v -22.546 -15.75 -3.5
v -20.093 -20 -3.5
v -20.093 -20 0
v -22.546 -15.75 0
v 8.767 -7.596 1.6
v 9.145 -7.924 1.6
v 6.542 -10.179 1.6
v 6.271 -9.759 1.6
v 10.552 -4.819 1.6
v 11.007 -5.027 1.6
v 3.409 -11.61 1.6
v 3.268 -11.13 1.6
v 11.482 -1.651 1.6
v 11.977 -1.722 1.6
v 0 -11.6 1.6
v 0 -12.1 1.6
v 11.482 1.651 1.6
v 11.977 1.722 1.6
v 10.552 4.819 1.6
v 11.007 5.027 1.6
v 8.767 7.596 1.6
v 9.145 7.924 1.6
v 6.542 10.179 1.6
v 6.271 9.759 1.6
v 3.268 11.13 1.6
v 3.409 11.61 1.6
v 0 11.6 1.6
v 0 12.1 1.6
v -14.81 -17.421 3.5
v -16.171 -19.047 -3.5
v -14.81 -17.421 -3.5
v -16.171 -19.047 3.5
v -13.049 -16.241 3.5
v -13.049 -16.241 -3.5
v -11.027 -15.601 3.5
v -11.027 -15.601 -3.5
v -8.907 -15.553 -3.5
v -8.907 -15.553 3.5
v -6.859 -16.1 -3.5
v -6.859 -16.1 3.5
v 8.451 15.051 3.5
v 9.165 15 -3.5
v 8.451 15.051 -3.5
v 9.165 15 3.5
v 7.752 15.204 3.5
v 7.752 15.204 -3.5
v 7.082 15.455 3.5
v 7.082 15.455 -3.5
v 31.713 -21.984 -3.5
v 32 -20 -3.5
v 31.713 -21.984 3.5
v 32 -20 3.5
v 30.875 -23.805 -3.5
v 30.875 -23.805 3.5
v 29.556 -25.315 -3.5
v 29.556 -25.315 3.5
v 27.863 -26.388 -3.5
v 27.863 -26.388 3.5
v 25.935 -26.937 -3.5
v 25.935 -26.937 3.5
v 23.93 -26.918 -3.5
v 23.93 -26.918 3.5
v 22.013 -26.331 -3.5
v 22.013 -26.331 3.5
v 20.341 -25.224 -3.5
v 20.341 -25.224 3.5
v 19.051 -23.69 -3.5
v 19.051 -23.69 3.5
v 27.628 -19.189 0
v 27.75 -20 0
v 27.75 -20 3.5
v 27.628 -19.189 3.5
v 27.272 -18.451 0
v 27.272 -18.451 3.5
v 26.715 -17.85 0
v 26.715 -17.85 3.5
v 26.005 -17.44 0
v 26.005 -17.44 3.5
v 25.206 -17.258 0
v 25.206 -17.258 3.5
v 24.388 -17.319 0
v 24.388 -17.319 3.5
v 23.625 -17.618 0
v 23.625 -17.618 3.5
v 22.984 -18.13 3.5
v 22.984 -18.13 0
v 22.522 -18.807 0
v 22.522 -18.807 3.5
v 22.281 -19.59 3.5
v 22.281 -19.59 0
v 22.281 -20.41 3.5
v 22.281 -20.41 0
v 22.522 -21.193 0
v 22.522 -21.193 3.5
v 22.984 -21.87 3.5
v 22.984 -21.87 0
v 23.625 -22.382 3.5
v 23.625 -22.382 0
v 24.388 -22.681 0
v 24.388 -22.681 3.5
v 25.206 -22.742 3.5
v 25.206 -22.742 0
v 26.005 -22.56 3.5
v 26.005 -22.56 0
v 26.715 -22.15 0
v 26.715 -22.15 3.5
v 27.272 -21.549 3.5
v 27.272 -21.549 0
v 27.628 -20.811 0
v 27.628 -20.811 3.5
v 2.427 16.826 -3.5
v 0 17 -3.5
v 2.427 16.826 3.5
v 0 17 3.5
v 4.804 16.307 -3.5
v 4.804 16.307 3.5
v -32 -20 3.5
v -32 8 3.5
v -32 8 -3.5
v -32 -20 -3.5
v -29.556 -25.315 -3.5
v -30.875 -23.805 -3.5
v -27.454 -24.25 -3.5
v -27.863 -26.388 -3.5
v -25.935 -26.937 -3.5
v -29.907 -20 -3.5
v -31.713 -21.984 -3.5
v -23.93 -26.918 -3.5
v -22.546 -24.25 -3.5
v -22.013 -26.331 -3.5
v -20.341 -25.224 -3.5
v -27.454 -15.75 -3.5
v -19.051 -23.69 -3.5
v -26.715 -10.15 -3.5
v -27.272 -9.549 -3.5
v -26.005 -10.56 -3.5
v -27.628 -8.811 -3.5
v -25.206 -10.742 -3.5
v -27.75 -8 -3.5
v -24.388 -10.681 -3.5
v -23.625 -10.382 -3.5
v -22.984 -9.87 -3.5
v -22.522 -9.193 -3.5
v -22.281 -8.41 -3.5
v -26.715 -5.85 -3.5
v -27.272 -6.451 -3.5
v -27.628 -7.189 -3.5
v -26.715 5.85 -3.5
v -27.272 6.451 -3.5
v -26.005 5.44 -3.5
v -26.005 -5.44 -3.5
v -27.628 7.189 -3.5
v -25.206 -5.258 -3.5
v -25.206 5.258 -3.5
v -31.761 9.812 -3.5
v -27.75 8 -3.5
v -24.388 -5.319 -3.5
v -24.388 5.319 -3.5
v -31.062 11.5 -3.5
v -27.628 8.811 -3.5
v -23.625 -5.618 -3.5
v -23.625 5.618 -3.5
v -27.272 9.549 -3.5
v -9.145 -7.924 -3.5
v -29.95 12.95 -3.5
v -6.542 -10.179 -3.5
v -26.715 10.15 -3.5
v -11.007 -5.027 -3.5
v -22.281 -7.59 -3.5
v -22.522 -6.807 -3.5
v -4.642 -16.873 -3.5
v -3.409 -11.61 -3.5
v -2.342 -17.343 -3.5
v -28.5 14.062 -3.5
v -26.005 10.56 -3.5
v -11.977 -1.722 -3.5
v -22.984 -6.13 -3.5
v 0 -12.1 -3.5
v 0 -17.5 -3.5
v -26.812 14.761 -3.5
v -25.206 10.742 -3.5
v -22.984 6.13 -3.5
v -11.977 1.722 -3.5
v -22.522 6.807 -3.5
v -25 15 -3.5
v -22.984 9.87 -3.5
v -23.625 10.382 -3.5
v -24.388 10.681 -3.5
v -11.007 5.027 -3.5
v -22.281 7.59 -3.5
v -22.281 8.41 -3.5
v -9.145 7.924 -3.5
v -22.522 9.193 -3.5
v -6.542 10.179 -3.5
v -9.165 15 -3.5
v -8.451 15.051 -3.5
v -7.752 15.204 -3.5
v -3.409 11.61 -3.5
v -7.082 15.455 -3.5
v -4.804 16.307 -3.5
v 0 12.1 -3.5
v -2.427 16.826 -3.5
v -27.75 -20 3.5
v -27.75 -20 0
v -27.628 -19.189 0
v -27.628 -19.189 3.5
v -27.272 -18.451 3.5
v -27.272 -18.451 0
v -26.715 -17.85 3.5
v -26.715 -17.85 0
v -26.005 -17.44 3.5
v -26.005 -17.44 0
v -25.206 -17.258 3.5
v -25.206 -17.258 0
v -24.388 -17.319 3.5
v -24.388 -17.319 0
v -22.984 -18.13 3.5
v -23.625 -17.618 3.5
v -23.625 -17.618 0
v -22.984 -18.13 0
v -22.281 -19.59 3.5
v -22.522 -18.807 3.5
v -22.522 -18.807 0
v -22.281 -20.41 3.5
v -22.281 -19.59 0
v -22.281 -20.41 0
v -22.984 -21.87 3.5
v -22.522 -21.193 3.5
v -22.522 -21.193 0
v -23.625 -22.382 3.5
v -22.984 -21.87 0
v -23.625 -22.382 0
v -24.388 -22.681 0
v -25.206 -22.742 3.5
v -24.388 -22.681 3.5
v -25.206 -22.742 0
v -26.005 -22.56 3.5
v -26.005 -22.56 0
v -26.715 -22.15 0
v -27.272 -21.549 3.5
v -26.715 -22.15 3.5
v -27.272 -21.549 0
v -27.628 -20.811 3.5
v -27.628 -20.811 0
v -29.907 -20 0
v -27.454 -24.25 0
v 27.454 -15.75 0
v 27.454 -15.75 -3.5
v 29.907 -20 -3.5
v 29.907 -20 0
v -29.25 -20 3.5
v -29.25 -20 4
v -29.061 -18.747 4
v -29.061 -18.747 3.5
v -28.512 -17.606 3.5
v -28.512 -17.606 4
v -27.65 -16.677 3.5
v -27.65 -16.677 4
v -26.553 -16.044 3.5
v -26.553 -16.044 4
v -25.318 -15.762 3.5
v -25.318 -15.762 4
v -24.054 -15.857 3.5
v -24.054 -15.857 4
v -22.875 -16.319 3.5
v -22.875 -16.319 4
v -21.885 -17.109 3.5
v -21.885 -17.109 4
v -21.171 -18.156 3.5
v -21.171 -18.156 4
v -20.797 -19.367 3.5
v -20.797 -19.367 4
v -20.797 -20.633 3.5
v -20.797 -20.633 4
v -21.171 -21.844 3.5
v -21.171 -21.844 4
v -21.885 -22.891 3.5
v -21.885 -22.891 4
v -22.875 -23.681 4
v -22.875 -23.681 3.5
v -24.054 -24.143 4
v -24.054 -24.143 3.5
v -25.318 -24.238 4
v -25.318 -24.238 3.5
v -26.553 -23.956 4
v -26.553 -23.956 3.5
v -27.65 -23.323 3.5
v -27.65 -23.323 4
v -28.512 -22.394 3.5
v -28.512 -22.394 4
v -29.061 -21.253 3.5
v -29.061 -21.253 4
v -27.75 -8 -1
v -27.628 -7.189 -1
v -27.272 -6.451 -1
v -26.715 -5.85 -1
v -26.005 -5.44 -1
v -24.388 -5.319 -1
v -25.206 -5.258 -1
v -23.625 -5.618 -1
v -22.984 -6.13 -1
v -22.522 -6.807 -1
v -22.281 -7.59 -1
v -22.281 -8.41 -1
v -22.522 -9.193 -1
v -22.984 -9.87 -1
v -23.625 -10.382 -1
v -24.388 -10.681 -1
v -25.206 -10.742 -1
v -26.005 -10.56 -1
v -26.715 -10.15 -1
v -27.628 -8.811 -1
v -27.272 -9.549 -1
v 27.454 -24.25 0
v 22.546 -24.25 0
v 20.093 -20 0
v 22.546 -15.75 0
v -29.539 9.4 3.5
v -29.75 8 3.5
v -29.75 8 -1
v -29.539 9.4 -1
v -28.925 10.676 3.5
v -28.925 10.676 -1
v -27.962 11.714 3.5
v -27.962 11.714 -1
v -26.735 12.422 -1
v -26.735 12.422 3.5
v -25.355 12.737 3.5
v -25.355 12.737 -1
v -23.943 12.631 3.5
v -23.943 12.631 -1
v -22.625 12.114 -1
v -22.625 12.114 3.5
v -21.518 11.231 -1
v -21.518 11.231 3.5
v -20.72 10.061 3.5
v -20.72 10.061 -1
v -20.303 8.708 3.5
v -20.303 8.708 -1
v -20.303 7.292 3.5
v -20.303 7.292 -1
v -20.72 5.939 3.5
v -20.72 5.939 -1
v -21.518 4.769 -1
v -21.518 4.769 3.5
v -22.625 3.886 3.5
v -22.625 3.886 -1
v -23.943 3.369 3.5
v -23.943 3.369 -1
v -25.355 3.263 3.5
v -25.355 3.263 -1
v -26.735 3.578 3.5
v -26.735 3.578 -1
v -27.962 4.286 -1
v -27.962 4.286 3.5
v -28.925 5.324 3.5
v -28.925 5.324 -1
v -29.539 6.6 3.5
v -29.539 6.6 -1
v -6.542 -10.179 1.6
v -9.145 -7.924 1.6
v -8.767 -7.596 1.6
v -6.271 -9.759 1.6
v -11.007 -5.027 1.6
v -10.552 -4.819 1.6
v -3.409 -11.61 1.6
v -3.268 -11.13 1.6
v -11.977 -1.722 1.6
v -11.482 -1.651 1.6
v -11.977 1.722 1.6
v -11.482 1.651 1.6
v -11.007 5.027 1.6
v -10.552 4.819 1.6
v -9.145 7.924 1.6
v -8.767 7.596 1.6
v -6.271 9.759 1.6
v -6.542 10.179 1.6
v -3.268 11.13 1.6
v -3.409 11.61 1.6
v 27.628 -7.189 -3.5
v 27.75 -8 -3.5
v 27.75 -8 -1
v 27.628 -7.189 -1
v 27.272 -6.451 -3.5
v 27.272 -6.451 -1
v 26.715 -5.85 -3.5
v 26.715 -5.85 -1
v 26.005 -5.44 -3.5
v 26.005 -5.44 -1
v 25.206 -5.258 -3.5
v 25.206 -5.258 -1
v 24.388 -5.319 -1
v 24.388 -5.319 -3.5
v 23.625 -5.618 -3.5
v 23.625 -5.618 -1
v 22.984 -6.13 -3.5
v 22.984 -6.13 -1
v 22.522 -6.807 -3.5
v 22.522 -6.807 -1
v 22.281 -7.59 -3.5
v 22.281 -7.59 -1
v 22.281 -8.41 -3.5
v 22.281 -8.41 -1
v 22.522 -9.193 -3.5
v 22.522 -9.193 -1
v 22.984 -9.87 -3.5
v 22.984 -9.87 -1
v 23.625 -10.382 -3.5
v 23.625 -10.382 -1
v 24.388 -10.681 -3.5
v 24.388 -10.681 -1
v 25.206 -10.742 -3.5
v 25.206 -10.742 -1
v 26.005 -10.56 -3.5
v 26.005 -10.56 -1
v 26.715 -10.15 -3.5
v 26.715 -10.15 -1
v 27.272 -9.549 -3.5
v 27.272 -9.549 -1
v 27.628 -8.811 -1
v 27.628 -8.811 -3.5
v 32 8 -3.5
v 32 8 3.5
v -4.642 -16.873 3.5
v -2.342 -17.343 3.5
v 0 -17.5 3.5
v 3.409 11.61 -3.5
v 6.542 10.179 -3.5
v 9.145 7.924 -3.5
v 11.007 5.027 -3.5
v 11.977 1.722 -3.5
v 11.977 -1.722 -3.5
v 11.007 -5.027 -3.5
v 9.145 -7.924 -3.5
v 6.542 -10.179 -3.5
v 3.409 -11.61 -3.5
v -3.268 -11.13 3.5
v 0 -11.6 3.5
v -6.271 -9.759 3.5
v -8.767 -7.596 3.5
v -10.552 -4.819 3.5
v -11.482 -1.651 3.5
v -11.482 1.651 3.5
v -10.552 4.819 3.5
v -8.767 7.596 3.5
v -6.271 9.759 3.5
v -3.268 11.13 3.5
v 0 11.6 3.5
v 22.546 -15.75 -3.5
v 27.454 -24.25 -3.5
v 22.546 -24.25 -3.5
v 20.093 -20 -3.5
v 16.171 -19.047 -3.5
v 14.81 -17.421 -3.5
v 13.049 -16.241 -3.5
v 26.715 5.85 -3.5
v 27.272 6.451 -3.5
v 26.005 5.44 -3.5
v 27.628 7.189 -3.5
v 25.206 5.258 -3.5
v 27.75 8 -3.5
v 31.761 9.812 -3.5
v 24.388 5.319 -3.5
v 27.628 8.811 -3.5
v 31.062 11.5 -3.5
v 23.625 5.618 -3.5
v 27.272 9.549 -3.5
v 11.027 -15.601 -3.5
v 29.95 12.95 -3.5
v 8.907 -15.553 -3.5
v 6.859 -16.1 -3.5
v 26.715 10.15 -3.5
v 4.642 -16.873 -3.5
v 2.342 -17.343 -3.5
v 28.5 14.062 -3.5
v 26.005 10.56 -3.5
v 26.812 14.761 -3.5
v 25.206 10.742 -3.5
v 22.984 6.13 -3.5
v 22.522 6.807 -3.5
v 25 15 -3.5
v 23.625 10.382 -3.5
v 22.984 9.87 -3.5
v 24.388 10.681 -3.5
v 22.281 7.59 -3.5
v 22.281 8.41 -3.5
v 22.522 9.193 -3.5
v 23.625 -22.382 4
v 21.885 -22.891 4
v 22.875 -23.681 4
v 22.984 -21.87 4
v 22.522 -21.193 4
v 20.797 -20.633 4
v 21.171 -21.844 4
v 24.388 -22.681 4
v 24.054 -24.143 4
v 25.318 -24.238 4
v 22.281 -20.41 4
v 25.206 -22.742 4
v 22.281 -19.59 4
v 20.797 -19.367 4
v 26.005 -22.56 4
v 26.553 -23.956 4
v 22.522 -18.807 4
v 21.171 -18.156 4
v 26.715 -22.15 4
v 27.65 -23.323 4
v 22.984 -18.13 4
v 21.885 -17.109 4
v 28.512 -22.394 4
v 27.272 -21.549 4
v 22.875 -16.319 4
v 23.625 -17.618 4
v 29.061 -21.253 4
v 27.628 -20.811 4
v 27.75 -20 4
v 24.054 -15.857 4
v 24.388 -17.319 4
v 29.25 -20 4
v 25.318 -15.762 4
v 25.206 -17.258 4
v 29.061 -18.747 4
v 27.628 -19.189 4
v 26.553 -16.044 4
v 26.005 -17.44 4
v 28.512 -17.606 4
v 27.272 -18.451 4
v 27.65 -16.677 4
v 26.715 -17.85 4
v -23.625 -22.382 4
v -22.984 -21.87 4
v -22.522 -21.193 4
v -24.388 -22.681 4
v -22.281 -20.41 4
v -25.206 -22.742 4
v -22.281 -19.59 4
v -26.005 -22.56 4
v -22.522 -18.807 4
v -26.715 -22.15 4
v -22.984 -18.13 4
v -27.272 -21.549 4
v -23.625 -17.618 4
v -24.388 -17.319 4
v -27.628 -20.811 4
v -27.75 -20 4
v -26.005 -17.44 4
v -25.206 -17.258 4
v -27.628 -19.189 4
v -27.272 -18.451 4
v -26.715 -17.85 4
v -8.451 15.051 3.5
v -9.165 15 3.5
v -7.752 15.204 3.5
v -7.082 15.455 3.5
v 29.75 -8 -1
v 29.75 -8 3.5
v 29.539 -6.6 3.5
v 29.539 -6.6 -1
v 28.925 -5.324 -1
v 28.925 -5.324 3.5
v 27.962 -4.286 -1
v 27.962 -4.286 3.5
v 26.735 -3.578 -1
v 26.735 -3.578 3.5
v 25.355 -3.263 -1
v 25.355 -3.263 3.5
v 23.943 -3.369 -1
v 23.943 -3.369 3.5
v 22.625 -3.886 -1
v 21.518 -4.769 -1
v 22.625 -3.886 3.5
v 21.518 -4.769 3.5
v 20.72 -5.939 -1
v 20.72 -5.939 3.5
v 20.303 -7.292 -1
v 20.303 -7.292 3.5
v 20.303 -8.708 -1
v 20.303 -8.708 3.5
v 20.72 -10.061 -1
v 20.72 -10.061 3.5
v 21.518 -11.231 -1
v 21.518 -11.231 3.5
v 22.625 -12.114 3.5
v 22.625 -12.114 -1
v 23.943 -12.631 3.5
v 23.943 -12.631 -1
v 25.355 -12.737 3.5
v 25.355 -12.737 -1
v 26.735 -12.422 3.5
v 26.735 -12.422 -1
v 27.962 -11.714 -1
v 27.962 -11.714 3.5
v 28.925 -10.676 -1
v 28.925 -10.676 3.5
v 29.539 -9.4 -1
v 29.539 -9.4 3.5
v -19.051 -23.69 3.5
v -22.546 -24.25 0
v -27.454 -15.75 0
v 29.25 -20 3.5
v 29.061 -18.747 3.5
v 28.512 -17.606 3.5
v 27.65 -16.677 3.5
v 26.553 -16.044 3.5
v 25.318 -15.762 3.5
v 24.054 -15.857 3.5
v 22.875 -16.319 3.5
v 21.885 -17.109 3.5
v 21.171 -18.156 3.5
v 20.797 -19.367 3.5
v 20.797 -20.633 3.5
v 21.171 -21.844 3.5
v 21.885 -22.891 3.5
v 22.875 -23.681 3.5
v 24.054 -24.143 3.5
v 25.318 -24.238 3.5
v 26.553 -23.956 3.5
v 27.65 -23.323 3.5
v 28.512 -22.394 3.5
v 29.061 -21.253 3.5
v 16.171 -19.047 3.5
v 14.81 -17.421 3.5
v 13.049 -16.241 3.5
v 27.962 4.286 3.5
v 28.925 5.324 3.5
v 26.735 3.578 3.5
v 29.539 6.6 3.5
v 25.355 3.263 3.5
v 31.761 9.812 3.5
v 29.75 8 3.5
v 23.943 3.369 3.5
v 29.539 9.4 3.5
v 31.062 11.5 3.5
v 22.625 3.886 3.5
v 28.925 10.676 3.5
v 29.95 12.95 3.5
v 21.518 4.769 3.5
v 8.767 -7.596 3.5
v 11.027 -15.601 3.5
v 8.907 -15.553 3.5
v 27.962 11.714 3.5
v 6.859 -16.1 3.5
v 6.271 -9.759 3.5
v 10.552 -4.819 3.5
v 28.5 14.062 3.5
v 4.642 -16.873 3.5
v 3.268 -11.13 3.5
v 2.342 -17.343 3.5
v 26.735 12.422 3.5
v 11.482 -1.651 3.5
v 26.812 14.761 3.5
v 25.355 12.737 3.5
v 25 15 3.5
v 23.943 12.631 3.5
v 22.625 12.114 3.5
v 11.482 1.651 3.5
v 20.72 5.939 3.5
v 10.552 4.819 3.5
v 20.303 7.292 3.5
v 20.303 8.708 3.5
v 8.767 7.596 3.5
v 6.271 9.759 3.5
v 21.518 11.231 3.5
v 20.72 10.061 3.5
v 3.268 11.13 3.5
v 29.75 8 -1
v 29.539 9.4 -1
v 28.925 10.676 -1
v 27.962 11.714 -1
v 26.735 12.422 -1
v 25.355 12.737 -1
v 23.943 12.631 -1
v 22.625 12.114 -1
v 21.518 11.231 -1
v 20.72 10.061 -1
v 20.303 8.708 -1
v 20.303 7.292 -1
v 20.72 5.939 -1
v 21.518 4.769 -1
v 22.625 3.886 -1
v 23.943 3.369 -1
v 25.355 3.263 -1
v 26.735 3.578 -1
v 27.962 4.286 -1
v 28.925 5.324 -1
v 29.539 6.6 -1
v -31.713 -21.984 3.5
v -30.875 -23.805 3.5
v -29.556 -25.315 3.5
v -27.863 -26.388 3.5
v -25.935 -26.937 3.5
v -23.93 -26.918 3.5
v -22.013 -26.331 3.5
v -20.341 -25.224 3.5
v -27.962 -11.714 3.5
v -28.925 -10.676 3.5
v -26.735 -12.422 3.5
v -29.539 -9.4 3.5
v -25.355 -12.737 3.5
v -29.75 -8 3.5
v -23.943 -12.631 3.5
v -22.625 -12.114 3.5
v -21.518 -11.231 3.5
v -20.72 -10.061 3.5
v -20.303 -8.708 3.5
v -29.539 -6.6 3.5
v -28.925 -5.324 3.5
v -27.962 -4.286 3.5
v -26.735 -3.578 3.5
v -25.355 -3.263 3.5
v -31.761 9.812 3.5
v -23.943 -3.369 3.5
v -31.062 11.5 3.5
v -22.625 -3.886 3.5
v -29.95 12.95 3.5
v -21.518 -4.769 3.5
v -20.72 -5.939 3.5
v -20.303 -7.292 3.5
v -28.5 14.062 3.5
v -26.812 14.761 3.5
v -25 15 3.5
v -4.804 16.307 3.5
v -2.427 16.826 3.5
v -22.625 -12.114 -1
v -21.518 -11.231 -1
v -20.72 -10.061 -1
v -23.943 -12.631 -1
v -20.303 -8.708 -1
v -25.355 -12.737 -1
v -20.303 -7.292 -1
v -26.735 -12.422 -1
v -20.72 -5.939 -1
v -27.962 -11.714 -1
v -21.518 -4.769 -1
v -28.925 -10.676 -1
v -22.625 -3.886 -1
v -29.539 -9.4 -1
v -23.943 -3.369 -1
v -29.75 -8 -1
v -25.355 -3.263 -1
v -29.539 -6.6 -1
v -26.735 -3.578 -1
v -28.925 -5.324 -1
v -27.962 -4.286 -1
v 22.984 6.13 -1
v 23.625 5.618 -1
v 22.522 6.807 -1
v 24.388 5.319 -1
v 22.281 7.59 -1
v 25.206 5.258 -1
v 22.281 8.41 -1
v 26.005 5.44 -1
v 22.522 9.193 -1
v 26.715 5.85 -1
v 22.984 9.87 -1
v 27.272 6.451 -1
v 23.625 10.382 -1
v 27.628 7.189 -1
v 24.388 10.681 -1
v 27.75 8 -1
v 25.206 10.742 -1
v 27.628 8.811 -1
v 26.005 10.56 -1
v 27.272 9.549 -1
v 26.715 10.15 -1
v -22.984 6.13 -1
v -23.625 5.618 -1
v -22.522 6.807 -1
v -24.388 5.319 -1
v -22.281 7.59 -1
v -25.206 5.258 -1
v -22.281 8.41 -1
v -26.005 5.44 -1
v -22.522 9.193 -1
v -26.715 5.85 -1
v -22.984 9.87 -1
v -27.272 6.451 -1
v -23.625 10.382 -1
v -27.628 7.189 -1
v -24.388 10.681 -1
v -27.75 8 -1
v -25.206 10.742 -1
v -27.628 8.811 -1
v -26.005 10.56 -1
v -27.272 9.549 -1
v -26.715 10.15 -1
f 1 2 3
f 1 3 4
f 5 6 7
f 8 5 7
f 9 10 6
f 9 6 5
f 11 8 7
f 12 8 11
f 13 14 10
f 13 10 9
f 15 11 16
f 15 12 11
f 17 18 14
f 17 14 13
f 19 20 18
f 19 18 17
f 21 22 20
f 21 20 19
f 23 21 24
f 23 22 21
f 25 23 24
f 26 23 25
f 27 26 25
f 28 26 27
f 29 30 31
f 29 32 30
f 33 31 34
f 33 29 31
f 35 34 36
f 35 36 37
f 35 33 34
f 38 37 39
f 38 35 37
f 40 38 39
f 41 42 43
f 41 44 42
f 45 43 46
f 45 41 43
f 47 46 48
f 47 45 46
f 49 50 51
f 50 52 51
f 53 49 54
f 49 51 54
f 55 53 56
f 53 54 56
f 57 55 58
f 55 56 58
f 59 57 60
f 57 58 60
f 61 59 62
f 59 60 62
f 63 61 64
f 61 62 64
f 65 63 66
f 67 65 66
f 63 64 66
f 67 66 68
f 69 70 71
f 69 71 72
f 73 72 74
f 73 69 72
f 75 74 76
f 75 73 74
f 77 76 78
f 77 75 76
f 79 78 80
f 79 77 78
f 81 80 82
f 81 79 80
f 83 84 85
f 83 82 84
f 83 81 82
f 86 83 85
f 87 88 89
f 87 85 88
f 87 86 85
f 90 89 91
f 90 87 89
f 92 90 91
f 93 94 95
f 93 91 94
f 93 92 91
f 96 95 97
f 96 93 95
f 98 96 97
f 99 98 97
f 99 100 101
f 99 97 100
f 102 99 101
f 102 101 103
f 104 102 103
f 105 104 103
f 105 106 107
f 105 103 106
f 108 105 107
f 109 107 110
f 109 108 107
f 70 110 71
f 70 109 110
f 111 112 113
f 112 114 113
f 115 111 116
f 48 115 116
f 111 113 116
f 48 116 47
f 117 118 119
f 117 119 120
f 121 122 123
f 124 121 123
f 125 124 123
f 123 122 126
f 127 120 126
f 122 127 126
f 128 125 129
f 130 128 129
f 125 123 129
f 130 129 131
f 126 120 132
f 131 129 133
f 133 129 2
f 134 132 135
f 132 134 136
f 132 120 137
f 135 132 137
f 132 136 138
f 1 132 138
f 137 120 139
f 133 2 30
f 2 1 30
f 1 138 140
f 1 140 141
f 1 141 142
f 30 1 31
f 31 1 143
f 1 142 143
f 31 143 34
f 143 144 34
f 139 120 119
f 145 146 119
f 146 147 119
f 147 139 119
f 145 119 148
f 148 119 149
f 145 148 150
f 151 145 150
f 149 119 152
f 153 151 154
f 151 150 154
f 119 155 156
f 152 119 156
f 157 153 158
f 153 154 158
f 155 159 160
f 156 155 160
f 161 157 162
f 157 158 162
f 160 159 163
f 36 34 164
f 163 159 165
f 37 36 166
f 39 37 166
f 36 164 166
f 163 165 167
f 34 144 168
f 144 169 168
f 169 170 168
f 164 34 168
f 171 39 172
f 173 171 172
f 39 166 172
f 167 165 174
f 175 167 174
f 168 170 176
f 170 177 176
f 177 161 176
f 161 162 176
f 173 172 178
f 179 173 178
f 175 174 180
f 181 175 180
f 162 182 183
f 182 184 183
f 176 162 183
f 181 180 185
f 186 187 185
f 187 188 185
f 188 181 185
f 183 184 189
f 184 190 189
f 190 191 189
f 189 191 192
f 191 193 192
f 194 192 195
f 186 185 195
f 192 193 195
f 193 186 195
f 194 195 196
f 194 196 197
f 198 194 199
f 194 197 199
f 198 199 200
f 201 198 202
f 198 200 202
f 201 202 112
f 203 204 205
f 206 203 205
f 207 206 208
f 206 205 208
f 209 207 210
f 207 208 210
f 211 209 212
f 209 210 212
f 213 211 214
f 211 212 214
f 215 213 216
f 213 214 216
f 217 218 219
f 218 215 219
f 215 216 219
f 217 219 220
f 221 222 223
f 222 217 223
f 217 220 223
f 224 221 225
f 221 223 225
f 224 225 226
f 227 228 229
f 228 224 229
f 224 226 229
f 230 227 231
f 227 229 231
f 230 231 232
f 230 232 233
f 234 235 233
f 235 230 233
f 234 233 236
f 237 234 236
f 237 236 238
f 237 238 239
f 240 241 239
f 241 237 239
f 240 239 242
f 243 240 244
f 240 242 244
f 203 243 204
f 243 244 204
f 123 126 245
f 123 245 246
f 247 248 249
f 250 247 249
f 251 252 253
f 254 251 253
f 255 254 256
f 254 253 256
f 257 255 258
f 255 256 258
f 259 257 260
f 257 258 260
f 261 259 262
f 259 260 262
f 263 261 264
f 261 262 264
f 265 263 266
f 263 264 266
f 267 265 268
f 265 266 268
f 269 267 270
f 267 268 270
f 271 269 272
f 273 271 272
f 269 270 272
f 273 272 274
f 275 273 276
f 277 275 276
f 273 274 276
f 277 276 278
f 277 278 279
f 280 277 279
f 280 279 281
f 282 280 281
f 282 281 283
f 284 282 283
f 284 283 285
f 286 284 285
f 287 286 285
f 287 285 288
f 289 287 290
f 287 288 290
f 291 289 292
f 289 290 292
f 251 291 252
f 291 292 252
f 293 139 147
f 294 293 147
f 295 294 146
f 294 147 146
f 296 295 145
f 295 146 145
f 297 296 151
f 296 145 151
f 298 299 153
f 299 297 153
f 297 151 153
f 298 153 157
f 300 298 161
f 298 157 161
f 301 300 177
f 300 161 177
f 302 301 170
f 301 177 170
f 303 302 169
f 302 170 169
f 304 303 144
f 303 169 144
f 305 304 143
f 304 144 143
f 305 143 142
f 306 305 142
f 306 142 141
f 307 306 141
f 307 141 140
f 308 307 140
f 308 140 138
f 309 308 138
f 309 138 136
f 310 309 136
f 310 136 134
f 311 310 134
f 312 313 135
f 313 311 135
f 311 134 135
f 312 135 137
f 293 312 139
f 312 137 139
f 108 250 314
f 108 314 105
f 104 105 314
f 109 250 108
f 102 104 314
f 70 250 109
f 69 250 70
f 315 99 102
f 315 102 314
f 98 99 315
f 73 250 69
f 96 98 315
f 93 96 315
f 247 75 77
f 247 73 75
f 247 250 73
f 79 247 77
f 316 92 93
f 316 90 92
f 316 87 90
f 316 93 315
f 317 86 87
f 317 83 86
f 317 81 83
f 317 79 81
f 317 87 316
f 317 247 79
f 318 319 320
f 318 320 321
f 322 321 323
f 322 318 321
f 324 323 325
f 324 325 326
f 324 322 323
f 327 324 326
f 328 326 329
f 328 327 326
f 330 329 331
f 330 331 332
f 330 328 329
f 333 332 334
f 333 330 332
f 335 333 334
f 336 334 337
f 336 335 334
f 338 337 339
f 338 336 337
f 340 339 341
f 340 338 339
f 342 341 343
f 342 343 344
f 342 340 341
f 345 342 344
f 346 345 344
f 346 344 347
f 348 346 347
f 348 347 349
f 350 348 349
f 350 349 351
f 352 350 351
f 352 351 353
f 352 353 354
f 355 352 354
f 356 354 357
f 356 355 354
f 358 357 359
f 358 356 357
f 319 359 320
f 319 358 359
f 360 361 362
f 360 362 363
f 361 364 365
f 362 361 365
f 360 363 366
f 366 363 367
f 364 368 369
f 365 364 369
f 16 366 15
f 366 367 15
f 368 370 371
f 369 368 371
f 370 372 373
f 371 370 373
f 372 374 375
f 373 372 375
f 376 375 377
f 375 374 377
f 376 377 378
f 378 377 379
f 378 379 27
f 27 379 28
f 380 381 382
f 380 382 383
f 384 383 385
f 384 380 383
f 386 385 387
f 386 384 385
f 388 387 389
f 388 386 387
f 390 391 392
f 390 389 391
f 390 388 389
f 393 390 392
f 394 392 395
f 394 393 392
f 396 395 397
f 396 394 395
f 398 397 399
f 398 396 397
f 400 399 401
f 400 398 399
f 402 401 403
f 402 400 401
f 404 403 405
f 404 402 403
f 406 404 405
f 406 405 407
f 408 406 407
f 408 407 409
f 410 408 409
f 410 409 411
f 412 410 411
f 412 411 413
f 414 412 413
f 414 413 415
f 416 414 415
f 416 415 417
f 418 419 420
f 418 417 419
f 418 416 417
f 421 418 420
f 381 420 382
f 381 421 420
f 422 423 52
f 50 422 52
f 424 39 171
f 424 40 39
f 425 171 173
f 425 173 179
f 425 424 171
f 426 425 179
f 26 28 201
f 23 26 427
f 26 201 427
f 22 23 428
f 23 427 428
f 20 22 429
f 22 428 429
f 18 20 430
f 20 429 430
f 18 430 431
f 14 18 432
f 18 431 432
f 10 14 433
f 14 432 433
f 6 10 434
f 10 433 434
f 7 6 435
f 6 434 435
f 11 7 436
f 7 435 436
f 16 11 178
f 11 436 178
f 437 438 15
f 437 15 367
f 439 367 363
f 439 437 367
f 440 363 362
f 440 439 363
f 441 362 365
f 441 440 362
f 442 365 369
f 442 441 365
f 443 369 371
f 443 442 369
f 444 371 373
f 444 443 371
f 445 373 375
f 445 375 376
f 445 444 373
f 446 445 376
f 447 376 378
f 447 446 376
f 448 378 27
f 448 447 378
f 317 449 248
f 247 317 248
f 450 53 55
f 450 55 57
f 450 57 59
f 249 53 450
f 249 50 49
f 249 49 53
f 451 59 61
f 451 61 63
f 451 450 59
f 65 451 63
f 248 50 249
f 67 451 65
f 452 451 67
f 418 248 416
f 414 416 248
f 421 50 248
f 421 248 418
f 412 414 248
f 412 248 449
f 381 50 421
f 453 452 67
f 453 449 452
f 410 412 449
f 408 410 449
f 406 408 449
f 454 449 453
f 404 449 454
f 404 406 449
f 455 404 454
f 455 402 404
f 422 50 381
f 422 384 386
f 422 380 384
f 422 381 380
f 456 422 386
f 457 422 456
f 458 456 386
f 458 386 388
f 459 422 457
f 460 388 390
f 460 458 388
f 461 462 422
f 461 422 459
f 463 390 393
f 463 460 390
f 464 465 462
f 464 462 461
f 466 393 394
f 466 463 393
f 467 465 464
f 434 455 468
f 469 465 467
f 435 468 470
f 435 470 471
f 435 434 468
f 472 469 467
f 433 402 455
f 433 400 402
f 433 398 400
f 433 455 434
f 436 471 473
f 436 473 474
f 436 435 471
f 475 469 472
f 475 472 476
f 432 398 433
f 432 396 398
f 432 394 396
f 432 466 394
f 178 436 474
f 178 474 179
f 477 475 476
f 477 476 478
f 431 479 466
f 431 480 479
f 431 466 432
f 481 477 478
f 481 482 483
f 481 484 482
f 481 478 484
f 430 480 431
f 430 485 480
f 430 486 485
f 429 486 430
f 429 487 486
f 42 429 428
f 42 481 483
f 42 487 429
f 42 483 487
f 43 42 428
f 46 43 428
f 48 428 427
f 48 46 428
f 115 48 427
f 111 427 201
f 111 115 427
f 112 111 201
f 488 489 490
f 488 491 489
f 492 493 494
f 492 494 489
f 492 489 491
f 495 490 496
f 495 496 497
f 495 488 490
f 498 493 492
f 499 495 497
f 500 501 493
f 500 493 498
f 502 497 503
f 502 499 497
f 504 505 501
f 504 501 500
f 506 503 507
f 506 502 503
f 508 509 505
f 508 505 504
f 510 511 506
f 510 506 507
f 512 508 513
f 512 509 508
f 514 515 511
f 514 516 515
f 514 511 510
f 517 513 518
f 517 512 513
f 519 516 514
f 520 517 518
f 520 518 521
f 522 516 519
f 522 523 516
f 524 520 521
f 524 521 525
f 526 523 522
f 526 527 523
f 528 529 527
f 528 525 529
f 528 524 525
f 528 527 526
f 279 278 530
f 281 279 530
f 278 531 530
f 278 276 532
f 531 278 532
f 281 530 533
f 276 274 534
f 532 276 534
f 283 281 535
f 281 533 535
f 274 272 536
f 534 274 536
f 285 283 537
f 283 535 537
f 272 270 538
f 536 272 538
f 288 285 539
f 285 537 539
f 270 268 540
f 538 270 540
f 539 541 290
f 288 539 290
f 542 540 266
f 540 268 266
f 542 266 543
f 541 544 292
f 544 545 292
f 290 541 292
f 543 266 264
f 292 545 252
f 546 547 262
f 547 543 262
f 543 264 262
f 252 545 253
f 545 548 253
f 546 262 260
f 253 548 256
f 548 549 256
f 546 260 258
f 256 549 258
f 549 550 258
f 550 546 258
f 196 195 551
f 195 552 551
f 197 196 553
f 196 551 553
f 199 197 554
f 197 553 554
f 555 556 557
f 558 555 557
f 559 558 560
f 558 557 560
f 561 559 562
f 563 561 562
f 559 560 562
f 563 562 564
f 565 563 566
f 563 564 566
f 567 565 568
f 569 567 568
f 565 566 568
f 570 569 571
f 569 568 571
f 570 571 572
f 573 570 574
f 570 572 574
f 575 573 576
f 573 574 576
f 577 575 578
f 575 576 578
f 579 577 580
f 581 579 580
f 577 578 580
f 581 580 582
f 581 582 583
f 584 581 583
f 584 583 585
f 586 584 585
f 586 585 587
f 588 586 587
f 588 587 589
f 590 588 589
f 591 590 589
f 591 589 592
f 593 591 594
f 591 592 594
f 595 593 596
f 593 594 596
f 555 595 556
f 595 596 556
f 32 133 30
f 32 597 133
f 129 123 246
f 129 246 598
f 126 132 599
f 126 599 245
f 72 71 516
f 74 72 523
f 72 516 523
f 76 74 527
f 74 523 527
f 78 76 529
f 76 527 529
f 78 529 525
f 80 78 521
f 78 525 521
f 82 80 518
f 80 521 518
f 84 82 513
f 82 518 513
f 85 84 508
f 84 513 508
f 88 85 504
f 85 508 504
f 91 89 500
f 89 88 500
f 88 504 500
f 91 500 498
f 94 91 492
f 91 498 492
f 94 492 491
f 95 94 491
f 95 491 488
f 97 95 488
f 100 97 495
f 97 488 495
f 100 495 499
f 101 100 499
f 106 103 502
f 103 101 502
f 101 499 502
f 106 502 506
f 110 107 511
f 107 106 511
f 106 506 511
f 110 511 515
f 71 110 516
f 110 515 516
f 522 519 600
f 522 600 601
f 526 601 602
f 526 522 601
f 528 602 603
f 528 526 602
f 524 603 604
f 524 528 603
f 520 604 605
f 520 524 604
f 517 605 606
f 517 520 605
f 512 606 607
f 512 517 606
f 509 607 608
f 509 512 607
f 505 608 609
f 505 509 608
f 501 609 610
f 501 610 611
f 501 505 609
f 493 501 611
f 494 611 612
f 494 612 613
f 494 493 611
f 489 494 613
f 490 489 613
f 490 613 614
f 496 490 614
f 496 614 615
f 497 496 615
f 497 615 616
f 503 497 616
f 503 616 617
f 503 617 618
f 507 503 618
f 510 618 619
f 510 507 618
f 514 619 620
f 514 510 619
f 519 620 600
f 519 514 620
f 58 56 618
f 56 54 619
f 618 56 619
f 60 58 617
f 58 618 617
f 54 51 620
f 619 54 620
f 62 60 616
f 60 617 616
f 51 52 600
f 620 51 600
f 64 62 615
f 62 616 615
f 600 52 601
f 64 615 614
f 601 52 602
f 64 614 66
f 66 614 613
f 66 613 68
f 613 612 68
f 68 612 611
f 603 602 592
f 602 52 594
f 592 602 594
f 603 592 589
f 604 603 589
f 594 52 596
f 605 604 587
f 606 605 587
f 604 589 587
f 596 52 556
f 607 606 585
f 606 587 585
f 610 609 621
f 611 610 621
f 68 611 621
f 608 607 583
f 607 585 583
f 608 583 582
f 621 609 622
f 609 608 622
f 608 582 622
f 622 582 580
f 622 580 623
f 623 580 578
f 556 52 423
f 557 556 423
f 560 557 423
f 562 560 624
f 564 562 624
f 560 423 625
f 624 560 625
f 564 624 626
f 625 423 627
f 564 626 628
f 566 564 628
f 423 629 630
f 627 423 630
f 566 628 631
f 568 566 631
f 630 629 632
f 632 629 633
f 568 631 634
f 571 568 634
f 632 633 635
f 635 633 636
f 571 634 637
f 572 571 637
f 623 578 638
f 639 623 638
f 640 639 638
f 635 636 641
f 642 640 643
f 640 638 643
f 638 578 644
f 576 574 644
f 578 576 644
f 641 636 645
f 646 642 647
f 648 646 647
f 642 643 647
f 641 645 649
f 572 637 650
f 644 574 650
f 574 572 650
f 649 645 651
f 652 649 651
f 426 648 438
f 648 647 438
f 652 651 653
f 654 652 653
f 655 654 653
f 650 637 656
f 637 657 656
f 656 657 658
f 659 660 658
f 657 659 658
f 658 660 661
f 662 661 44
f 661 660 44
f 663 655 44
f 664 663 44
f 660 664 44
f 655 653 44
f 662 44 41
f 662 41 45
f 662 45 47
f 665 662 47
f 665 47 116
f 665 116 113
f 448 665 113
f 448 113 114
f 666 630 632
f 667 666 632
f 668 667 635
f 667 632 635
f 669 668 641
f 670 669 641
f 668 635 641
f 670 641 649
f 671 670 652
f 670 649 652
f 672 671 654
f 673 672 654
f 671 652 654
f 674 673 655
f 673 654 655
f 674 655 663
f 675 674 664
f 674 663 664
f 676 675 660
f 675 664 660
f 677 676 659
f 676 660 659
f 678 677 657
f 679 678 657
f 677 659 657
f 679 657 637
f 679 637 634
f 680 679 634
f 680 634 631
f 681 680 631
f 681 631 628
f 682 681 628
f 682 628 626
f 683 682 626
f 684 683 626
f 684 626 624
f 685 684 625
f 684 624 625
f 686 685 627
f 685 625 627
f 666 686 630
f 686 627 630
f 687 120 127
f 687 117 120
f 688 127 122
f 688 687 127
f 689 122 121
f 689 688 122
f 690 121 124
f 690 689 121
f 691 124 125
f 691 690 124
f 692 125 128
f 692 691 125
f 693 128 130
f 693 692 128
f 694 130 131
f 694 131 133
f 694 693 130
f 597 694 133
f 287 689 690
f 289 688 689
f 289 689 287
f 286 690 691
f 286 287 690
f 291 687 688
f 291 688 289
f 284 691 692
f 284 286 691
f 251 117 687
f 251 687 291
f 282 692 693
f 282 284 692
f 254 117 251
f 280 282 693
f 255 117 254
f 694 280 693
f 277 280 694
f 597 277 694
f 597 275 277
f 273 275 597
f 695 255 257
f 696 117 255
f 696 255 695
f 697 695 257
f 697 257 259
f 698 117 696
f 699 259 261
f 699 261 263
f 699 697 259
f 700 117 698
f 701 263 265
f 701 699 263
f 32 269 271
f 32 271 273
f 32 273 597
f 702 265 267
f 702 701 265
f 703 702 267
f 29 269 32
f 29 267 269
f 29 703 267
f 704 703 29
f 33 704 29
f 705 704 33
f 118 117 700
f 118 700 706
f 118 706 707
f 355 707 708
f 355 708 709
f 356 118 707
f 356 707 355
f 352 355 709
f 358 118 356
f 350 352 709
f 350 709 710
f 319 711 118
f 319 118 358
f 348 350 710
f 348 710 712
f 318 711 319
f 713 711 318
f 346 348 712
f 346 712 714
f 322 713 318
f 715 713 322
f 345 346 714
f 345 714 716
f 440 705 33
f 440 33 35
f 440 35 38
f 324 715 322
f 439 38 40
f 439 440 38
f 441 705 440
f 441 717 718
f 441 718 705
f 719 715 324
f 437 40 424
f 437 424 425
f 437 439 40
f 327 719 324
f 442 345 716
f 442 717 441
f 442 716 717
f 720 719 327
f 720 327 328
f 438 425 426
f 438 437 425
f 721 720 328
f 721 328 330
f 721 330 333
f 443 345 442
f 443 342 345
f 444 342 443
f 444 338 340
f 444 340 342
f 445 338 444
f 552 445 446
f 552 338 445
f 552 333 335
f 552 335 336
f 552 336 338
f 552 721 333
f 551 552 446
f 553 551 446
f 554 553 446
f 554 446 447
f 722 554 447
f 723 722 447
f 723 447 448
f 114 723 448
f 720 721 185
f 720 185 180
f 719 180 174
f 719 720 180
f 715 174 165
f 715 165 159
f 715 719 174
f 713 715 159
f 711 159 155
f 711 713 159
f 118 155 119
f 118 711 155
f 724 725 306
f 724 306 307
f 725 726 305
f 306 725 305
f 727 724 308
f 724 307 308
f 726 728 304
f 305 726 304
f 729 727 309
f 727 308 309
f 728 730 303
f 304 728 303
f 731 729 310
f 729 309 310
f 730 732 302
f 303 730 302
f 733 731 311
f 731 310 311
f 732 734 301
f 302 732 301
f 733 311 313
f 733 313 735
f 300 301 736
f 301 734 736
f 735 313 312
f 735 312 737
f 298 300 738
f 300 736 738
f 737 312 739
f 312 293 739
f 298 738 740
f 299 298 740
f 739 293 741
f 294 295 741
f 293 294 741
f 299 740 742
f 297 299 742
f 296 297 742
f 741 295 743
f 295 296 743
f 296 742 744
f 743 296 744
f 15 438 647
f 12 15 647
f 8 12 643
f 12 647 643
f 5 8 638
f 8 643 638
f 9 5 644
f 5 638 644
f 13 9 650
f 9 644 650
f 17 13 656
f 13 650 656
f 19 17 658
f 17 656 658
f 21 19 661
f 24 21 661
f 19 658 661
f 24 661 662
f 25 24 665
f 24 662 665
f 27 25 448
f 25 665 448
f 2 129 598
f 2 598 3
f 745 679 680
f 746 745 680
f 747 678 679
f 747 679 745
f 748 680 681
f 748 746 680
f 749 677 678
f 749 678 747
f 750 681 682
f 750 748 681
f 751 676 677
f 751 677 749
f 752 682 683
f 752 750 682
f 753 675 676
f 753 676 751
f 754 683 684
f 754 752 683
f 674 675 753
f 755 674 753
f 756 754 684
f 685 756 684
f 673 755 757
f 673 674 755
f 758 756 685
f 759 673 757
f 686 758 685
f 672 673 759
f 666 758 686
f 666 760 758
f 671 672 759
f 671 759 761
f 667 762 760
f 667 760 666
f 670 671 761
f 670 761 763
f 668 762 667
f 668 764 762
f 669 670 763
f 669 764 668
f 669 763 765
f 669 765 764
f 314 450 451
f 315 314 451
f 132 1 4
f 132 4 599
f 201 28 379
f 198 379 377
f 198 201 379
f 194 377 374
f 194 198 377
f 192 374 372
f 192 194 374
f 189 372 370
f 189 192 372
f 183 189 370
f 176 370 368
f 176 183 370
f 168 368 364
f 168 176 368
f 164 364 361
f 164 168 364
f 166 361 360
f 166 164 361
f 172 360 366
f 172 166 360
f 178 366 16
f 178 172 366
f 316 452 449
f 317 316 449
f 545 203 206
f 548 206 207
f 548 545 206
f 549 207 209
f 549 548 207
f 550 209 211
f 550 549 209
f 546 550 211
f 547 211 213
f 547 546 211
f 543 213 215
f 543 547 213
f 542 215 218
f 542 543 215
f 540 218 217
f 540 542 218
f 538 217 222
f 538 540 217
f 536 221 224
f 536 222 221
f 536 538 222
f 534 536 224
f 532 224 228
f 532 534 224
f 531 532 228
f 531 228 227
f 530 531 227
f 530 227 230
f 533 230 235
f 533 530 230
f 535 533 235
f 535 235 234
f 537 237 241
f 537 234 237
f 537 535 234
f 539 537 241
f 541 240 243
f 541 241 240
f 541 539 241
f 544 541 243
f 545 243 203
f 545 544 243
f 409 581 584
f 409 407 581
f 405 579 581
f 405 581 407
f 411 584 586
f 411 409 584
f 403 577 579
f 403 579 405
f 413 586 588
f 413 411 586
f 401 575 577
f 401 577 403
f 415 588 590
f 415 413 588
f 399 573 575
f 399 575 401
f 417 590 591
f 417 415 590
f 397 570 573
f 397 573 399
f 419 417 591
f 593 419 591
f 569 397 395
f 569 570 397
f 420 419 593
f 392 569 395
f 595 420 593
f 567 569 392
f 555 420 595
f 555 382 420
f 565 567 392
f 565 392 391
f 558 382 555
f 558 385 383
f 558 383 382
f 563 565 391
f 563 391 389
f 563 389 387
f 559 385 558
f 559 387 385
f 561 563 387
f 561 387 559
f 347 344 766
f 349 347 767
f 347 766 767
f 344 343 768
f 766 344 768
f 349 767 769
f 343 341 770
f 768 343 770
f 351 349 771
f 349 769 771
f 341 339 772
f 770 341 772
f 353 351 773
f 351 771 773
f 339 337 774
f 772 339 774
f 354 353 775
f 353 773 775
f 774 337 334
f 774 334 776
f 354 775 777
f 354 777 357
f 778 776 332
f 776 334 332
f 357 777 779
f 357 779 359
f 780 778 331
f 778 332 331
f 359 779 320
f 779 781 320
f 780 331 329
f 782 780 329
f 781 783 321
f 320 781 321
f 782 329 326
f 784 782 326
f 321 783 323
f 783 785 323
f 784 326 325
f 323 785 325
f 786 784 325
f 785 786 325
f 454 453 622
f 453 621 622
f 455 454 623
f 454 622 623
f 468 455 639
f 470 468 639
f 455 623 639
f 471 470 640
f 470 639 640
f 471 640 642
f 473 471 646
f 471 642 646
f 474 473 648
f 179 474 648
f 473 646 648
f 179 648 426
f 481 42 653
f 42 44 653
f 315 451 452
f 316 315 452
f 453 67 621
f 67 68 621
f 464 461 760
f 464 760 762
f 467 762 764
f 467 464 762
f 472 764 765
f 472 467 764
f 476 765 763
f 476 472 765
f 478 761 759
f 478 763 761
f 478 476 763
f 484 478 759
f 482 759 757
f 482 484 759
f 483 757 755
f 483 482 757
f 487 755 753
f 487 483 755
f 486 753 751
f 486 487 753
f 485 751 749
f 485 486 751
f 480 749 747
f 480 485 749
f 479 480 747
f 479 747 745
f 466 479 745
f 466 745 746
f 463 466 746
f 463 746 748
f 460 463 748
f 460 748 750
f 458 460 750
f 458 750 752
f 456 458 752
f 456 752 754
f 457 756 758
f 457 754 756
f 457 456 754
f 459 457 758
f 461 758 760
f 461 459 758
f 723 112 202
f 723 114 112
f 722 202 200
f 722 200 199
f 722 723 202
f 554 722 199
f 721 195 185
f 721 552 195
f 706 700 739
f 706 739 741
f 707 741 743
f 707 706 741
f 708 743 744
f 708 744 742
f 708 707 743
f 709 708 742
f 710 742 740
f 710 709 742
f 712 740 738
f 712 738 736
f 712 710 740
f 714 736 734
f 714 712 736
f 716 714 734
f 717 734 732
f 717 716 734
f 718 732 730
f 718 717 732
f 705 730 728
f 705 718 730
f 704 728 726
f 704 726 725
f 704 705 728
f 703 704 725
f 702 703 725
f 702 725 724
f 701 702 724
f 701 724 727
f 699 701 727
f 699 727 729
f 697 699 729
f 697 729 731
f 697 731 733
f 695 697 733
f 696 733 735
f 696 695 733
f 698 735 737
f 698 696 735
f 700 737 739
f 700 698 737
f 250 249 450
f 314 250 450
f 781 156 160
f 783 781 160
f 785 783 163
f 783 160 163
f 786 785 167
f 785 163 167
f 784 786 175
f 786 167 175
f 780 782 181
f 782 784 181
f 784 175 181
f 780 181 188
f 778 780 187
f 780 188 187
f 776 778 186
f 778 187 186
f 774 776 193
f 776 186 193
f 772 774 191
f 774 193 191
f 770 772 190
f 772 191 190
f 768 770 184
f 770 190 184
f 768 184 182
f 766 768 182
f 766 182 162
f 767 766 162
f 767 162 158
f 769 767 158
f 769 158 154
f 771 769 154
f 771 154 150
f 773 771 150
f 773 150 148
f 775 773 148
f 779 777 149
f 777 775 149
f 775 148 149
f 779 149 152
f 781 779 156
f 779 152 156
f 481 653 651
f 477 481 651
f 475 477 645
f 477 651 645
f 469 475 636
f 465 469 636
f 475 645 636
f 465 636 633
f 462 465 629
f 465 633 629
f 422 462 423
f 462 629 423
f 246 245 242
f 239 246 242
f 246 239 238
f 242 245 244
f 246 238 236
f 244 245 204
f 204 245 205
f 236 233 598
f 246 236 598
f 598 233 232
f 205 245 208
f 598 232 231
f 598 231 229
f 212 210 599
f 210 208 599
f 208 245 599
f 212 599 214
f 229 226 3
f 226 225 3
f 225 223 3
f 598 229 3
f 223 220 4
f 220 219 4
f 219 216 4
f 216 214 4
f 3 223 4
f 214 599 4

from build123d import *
from build123d.topology import SkipClean

# Parameters (mm, degrees)
BOSS_EXTRUDE1_DEPTH     = 3.5
CUT_EXTRUDE1_DEPTH      = 43.449971699
CUT_EXTRUDE1_DEPTH_BACK = 43.449971699
SKETCH3_R               = 2.75
SKETCH4_R               = 12.1
CUT_EXTRUDE2_DEPTH      = 5.1
BOSS_EXTRUDE2_START     = 0.5
SKETCH5_R               = 4.25
SKETCH5_R_2             = 2.75
BOSS_EXTRUDE2_DEPTH     = 0.5
SKETCH6_R               = 4.75
CUT_EXTRUDE3_DEPTH      = 4.5
FILLET1_R               = 5
CUT_EXTRUDE4_DEPTH      = 3.5


with BuildPart() as part:
    # Sketch1 → Boss-Extrude1 (new, symmetric)
    with BuildSketch(Plane.XY):
        with BuildLine():
            Line((32.00000152, 7.999997932), (32.00000152, -20))
            ThreePointArc((32.00000152, -20), (26.918315181, -26.732018471), (19.051409321, -23.689749429))
            Line((19.051409321, -23.689749429), (16.171450613, -19.04669704))
            ThreePointArc((16.171450613, -19.04669704), (12.060484849, -15.849407252), (6.85857128, -16.1))
            ThreePointArc((6.85857128, -16.1), (3.5, -17.146428199), (0, -17.5))
            Line((0, -17.5), (0, -11.6))
            ThreePointArc((0, -11.6), (11.6, 0), (0, 11.6))
            Line((0, 11.6), (0, 17))
            ThreePointArc((0, 17), (4.123105626, 16.492422502), (8, 15))
            Line((8, 15), (25.00000152, 15))
            ThreePointArc((25.00000152, 15), (29.949750451, 12.949746862), (32.00000152, 7.999997932))
        make_face()
    extrude(amount=BOSS_EXTRUDE1_DEPTH, both=True)

    # Sketch3 → Cut-Extrude1 (cut, two sides: drawn at the far end of the back side and taken through both)
    with BuildSketch(Plane.XY.offset(3.5).offset(-CUT_EXTRUDE1_DEPTH_BACK)):
        with Locations((25.00000152, 7.999998966)):
            Circle(SKETCH3_R)
        with Locations((25.00000152, -8.000001034)):
            Circle(SKETCH3_R)
        with Locations((25.00000152, -20.000001034)):
            Circle(SKETCH3_R)
    extrude(amount=CUT_EXTRUDE1_DEPTH + CUT_EXTRUDE1_DEPTH_BACK, mode=Mode.SUBTRACT)

    # Sketch4 → Cut-Extrude2 (cut)
    with BuildSketch(Plane(origin=(0, 0, -3.5), x_dir=(-1, 0, 0), z_dir=(0, 0, -1))):
        Circle(SKETCH4_R)
    extrude(amount=-CUT_EXTRUDE2_DEPTH, mode=Mode.SUBTRACT)

    # Sketch5 → Boss-Extrude2 (add)
    with BuildSketch(Plane.XY.offset(3.5).offset(BOSS_EXTRUDE2_START)):
        with Locations((25.00000152, -20.000001034)):
            Circle(SKETCH5_R)
        with Locations((25.00000152, -20.000001034)):
            Circle(SKETCH5_R_2, mode=Mode.SUBTRACT)
    extrude(amount=-BOSS_EXTRUDE2_DEPTH)

    # Sketch6 → Cut-Extrude3 (cut)
    with BuildSketch(Plane.XY.offset(3.5)):
        with Locations((25.00000152, -8.000001034)):
            Circle(SKETCH6_R)
        with Locations((25.00000152, 7.999998966)):
            Circle(SKETCH6_R)
    extrude(amount=-CUT_EXTRUDE3_DEPTH, mode=Mode.SUBTRACT)

    # Fillet1
    fillet1_edges = [part.edges().sort_by_distance(p)[0] for p in [
        (8, 15, 0),
    ]]
    fillet(fillet1_edges, radius=FILLET1_R)

    # Sketch8 → Cut-Extrude4 (cut)
    with BuildSketch(Plane(origin=(0, 0, -3.5), x_dir=(-1, 0, 0), z_dir=(0, 0, -1))):
        Polygon((-22.546262876, -15.750001034), (-27.453740164, -15.750001034), (-29.907478808, -20.000001034), (-27.453740164, -24.250001034), (-22.546262876, -24.250001034), (-20.092524232, -20.000001034), align=None)
    extrude(amount=-CUT_EXTRUDE4_DEPTH, mode=Mode.SUBTRACT)

    # Mirror2: part across plane


with BuildPart() as part_1:
    with SkipClean():  # the faces are left unmerged after this step: merging them gives an invalid solid
        add(part.part)
        add(part.part.mirror(Plane(origin=(0, 17, 3.5), x_dir=(0, 0, 1), z_dir=(1, 0, 0))))


solid = part_1.part
